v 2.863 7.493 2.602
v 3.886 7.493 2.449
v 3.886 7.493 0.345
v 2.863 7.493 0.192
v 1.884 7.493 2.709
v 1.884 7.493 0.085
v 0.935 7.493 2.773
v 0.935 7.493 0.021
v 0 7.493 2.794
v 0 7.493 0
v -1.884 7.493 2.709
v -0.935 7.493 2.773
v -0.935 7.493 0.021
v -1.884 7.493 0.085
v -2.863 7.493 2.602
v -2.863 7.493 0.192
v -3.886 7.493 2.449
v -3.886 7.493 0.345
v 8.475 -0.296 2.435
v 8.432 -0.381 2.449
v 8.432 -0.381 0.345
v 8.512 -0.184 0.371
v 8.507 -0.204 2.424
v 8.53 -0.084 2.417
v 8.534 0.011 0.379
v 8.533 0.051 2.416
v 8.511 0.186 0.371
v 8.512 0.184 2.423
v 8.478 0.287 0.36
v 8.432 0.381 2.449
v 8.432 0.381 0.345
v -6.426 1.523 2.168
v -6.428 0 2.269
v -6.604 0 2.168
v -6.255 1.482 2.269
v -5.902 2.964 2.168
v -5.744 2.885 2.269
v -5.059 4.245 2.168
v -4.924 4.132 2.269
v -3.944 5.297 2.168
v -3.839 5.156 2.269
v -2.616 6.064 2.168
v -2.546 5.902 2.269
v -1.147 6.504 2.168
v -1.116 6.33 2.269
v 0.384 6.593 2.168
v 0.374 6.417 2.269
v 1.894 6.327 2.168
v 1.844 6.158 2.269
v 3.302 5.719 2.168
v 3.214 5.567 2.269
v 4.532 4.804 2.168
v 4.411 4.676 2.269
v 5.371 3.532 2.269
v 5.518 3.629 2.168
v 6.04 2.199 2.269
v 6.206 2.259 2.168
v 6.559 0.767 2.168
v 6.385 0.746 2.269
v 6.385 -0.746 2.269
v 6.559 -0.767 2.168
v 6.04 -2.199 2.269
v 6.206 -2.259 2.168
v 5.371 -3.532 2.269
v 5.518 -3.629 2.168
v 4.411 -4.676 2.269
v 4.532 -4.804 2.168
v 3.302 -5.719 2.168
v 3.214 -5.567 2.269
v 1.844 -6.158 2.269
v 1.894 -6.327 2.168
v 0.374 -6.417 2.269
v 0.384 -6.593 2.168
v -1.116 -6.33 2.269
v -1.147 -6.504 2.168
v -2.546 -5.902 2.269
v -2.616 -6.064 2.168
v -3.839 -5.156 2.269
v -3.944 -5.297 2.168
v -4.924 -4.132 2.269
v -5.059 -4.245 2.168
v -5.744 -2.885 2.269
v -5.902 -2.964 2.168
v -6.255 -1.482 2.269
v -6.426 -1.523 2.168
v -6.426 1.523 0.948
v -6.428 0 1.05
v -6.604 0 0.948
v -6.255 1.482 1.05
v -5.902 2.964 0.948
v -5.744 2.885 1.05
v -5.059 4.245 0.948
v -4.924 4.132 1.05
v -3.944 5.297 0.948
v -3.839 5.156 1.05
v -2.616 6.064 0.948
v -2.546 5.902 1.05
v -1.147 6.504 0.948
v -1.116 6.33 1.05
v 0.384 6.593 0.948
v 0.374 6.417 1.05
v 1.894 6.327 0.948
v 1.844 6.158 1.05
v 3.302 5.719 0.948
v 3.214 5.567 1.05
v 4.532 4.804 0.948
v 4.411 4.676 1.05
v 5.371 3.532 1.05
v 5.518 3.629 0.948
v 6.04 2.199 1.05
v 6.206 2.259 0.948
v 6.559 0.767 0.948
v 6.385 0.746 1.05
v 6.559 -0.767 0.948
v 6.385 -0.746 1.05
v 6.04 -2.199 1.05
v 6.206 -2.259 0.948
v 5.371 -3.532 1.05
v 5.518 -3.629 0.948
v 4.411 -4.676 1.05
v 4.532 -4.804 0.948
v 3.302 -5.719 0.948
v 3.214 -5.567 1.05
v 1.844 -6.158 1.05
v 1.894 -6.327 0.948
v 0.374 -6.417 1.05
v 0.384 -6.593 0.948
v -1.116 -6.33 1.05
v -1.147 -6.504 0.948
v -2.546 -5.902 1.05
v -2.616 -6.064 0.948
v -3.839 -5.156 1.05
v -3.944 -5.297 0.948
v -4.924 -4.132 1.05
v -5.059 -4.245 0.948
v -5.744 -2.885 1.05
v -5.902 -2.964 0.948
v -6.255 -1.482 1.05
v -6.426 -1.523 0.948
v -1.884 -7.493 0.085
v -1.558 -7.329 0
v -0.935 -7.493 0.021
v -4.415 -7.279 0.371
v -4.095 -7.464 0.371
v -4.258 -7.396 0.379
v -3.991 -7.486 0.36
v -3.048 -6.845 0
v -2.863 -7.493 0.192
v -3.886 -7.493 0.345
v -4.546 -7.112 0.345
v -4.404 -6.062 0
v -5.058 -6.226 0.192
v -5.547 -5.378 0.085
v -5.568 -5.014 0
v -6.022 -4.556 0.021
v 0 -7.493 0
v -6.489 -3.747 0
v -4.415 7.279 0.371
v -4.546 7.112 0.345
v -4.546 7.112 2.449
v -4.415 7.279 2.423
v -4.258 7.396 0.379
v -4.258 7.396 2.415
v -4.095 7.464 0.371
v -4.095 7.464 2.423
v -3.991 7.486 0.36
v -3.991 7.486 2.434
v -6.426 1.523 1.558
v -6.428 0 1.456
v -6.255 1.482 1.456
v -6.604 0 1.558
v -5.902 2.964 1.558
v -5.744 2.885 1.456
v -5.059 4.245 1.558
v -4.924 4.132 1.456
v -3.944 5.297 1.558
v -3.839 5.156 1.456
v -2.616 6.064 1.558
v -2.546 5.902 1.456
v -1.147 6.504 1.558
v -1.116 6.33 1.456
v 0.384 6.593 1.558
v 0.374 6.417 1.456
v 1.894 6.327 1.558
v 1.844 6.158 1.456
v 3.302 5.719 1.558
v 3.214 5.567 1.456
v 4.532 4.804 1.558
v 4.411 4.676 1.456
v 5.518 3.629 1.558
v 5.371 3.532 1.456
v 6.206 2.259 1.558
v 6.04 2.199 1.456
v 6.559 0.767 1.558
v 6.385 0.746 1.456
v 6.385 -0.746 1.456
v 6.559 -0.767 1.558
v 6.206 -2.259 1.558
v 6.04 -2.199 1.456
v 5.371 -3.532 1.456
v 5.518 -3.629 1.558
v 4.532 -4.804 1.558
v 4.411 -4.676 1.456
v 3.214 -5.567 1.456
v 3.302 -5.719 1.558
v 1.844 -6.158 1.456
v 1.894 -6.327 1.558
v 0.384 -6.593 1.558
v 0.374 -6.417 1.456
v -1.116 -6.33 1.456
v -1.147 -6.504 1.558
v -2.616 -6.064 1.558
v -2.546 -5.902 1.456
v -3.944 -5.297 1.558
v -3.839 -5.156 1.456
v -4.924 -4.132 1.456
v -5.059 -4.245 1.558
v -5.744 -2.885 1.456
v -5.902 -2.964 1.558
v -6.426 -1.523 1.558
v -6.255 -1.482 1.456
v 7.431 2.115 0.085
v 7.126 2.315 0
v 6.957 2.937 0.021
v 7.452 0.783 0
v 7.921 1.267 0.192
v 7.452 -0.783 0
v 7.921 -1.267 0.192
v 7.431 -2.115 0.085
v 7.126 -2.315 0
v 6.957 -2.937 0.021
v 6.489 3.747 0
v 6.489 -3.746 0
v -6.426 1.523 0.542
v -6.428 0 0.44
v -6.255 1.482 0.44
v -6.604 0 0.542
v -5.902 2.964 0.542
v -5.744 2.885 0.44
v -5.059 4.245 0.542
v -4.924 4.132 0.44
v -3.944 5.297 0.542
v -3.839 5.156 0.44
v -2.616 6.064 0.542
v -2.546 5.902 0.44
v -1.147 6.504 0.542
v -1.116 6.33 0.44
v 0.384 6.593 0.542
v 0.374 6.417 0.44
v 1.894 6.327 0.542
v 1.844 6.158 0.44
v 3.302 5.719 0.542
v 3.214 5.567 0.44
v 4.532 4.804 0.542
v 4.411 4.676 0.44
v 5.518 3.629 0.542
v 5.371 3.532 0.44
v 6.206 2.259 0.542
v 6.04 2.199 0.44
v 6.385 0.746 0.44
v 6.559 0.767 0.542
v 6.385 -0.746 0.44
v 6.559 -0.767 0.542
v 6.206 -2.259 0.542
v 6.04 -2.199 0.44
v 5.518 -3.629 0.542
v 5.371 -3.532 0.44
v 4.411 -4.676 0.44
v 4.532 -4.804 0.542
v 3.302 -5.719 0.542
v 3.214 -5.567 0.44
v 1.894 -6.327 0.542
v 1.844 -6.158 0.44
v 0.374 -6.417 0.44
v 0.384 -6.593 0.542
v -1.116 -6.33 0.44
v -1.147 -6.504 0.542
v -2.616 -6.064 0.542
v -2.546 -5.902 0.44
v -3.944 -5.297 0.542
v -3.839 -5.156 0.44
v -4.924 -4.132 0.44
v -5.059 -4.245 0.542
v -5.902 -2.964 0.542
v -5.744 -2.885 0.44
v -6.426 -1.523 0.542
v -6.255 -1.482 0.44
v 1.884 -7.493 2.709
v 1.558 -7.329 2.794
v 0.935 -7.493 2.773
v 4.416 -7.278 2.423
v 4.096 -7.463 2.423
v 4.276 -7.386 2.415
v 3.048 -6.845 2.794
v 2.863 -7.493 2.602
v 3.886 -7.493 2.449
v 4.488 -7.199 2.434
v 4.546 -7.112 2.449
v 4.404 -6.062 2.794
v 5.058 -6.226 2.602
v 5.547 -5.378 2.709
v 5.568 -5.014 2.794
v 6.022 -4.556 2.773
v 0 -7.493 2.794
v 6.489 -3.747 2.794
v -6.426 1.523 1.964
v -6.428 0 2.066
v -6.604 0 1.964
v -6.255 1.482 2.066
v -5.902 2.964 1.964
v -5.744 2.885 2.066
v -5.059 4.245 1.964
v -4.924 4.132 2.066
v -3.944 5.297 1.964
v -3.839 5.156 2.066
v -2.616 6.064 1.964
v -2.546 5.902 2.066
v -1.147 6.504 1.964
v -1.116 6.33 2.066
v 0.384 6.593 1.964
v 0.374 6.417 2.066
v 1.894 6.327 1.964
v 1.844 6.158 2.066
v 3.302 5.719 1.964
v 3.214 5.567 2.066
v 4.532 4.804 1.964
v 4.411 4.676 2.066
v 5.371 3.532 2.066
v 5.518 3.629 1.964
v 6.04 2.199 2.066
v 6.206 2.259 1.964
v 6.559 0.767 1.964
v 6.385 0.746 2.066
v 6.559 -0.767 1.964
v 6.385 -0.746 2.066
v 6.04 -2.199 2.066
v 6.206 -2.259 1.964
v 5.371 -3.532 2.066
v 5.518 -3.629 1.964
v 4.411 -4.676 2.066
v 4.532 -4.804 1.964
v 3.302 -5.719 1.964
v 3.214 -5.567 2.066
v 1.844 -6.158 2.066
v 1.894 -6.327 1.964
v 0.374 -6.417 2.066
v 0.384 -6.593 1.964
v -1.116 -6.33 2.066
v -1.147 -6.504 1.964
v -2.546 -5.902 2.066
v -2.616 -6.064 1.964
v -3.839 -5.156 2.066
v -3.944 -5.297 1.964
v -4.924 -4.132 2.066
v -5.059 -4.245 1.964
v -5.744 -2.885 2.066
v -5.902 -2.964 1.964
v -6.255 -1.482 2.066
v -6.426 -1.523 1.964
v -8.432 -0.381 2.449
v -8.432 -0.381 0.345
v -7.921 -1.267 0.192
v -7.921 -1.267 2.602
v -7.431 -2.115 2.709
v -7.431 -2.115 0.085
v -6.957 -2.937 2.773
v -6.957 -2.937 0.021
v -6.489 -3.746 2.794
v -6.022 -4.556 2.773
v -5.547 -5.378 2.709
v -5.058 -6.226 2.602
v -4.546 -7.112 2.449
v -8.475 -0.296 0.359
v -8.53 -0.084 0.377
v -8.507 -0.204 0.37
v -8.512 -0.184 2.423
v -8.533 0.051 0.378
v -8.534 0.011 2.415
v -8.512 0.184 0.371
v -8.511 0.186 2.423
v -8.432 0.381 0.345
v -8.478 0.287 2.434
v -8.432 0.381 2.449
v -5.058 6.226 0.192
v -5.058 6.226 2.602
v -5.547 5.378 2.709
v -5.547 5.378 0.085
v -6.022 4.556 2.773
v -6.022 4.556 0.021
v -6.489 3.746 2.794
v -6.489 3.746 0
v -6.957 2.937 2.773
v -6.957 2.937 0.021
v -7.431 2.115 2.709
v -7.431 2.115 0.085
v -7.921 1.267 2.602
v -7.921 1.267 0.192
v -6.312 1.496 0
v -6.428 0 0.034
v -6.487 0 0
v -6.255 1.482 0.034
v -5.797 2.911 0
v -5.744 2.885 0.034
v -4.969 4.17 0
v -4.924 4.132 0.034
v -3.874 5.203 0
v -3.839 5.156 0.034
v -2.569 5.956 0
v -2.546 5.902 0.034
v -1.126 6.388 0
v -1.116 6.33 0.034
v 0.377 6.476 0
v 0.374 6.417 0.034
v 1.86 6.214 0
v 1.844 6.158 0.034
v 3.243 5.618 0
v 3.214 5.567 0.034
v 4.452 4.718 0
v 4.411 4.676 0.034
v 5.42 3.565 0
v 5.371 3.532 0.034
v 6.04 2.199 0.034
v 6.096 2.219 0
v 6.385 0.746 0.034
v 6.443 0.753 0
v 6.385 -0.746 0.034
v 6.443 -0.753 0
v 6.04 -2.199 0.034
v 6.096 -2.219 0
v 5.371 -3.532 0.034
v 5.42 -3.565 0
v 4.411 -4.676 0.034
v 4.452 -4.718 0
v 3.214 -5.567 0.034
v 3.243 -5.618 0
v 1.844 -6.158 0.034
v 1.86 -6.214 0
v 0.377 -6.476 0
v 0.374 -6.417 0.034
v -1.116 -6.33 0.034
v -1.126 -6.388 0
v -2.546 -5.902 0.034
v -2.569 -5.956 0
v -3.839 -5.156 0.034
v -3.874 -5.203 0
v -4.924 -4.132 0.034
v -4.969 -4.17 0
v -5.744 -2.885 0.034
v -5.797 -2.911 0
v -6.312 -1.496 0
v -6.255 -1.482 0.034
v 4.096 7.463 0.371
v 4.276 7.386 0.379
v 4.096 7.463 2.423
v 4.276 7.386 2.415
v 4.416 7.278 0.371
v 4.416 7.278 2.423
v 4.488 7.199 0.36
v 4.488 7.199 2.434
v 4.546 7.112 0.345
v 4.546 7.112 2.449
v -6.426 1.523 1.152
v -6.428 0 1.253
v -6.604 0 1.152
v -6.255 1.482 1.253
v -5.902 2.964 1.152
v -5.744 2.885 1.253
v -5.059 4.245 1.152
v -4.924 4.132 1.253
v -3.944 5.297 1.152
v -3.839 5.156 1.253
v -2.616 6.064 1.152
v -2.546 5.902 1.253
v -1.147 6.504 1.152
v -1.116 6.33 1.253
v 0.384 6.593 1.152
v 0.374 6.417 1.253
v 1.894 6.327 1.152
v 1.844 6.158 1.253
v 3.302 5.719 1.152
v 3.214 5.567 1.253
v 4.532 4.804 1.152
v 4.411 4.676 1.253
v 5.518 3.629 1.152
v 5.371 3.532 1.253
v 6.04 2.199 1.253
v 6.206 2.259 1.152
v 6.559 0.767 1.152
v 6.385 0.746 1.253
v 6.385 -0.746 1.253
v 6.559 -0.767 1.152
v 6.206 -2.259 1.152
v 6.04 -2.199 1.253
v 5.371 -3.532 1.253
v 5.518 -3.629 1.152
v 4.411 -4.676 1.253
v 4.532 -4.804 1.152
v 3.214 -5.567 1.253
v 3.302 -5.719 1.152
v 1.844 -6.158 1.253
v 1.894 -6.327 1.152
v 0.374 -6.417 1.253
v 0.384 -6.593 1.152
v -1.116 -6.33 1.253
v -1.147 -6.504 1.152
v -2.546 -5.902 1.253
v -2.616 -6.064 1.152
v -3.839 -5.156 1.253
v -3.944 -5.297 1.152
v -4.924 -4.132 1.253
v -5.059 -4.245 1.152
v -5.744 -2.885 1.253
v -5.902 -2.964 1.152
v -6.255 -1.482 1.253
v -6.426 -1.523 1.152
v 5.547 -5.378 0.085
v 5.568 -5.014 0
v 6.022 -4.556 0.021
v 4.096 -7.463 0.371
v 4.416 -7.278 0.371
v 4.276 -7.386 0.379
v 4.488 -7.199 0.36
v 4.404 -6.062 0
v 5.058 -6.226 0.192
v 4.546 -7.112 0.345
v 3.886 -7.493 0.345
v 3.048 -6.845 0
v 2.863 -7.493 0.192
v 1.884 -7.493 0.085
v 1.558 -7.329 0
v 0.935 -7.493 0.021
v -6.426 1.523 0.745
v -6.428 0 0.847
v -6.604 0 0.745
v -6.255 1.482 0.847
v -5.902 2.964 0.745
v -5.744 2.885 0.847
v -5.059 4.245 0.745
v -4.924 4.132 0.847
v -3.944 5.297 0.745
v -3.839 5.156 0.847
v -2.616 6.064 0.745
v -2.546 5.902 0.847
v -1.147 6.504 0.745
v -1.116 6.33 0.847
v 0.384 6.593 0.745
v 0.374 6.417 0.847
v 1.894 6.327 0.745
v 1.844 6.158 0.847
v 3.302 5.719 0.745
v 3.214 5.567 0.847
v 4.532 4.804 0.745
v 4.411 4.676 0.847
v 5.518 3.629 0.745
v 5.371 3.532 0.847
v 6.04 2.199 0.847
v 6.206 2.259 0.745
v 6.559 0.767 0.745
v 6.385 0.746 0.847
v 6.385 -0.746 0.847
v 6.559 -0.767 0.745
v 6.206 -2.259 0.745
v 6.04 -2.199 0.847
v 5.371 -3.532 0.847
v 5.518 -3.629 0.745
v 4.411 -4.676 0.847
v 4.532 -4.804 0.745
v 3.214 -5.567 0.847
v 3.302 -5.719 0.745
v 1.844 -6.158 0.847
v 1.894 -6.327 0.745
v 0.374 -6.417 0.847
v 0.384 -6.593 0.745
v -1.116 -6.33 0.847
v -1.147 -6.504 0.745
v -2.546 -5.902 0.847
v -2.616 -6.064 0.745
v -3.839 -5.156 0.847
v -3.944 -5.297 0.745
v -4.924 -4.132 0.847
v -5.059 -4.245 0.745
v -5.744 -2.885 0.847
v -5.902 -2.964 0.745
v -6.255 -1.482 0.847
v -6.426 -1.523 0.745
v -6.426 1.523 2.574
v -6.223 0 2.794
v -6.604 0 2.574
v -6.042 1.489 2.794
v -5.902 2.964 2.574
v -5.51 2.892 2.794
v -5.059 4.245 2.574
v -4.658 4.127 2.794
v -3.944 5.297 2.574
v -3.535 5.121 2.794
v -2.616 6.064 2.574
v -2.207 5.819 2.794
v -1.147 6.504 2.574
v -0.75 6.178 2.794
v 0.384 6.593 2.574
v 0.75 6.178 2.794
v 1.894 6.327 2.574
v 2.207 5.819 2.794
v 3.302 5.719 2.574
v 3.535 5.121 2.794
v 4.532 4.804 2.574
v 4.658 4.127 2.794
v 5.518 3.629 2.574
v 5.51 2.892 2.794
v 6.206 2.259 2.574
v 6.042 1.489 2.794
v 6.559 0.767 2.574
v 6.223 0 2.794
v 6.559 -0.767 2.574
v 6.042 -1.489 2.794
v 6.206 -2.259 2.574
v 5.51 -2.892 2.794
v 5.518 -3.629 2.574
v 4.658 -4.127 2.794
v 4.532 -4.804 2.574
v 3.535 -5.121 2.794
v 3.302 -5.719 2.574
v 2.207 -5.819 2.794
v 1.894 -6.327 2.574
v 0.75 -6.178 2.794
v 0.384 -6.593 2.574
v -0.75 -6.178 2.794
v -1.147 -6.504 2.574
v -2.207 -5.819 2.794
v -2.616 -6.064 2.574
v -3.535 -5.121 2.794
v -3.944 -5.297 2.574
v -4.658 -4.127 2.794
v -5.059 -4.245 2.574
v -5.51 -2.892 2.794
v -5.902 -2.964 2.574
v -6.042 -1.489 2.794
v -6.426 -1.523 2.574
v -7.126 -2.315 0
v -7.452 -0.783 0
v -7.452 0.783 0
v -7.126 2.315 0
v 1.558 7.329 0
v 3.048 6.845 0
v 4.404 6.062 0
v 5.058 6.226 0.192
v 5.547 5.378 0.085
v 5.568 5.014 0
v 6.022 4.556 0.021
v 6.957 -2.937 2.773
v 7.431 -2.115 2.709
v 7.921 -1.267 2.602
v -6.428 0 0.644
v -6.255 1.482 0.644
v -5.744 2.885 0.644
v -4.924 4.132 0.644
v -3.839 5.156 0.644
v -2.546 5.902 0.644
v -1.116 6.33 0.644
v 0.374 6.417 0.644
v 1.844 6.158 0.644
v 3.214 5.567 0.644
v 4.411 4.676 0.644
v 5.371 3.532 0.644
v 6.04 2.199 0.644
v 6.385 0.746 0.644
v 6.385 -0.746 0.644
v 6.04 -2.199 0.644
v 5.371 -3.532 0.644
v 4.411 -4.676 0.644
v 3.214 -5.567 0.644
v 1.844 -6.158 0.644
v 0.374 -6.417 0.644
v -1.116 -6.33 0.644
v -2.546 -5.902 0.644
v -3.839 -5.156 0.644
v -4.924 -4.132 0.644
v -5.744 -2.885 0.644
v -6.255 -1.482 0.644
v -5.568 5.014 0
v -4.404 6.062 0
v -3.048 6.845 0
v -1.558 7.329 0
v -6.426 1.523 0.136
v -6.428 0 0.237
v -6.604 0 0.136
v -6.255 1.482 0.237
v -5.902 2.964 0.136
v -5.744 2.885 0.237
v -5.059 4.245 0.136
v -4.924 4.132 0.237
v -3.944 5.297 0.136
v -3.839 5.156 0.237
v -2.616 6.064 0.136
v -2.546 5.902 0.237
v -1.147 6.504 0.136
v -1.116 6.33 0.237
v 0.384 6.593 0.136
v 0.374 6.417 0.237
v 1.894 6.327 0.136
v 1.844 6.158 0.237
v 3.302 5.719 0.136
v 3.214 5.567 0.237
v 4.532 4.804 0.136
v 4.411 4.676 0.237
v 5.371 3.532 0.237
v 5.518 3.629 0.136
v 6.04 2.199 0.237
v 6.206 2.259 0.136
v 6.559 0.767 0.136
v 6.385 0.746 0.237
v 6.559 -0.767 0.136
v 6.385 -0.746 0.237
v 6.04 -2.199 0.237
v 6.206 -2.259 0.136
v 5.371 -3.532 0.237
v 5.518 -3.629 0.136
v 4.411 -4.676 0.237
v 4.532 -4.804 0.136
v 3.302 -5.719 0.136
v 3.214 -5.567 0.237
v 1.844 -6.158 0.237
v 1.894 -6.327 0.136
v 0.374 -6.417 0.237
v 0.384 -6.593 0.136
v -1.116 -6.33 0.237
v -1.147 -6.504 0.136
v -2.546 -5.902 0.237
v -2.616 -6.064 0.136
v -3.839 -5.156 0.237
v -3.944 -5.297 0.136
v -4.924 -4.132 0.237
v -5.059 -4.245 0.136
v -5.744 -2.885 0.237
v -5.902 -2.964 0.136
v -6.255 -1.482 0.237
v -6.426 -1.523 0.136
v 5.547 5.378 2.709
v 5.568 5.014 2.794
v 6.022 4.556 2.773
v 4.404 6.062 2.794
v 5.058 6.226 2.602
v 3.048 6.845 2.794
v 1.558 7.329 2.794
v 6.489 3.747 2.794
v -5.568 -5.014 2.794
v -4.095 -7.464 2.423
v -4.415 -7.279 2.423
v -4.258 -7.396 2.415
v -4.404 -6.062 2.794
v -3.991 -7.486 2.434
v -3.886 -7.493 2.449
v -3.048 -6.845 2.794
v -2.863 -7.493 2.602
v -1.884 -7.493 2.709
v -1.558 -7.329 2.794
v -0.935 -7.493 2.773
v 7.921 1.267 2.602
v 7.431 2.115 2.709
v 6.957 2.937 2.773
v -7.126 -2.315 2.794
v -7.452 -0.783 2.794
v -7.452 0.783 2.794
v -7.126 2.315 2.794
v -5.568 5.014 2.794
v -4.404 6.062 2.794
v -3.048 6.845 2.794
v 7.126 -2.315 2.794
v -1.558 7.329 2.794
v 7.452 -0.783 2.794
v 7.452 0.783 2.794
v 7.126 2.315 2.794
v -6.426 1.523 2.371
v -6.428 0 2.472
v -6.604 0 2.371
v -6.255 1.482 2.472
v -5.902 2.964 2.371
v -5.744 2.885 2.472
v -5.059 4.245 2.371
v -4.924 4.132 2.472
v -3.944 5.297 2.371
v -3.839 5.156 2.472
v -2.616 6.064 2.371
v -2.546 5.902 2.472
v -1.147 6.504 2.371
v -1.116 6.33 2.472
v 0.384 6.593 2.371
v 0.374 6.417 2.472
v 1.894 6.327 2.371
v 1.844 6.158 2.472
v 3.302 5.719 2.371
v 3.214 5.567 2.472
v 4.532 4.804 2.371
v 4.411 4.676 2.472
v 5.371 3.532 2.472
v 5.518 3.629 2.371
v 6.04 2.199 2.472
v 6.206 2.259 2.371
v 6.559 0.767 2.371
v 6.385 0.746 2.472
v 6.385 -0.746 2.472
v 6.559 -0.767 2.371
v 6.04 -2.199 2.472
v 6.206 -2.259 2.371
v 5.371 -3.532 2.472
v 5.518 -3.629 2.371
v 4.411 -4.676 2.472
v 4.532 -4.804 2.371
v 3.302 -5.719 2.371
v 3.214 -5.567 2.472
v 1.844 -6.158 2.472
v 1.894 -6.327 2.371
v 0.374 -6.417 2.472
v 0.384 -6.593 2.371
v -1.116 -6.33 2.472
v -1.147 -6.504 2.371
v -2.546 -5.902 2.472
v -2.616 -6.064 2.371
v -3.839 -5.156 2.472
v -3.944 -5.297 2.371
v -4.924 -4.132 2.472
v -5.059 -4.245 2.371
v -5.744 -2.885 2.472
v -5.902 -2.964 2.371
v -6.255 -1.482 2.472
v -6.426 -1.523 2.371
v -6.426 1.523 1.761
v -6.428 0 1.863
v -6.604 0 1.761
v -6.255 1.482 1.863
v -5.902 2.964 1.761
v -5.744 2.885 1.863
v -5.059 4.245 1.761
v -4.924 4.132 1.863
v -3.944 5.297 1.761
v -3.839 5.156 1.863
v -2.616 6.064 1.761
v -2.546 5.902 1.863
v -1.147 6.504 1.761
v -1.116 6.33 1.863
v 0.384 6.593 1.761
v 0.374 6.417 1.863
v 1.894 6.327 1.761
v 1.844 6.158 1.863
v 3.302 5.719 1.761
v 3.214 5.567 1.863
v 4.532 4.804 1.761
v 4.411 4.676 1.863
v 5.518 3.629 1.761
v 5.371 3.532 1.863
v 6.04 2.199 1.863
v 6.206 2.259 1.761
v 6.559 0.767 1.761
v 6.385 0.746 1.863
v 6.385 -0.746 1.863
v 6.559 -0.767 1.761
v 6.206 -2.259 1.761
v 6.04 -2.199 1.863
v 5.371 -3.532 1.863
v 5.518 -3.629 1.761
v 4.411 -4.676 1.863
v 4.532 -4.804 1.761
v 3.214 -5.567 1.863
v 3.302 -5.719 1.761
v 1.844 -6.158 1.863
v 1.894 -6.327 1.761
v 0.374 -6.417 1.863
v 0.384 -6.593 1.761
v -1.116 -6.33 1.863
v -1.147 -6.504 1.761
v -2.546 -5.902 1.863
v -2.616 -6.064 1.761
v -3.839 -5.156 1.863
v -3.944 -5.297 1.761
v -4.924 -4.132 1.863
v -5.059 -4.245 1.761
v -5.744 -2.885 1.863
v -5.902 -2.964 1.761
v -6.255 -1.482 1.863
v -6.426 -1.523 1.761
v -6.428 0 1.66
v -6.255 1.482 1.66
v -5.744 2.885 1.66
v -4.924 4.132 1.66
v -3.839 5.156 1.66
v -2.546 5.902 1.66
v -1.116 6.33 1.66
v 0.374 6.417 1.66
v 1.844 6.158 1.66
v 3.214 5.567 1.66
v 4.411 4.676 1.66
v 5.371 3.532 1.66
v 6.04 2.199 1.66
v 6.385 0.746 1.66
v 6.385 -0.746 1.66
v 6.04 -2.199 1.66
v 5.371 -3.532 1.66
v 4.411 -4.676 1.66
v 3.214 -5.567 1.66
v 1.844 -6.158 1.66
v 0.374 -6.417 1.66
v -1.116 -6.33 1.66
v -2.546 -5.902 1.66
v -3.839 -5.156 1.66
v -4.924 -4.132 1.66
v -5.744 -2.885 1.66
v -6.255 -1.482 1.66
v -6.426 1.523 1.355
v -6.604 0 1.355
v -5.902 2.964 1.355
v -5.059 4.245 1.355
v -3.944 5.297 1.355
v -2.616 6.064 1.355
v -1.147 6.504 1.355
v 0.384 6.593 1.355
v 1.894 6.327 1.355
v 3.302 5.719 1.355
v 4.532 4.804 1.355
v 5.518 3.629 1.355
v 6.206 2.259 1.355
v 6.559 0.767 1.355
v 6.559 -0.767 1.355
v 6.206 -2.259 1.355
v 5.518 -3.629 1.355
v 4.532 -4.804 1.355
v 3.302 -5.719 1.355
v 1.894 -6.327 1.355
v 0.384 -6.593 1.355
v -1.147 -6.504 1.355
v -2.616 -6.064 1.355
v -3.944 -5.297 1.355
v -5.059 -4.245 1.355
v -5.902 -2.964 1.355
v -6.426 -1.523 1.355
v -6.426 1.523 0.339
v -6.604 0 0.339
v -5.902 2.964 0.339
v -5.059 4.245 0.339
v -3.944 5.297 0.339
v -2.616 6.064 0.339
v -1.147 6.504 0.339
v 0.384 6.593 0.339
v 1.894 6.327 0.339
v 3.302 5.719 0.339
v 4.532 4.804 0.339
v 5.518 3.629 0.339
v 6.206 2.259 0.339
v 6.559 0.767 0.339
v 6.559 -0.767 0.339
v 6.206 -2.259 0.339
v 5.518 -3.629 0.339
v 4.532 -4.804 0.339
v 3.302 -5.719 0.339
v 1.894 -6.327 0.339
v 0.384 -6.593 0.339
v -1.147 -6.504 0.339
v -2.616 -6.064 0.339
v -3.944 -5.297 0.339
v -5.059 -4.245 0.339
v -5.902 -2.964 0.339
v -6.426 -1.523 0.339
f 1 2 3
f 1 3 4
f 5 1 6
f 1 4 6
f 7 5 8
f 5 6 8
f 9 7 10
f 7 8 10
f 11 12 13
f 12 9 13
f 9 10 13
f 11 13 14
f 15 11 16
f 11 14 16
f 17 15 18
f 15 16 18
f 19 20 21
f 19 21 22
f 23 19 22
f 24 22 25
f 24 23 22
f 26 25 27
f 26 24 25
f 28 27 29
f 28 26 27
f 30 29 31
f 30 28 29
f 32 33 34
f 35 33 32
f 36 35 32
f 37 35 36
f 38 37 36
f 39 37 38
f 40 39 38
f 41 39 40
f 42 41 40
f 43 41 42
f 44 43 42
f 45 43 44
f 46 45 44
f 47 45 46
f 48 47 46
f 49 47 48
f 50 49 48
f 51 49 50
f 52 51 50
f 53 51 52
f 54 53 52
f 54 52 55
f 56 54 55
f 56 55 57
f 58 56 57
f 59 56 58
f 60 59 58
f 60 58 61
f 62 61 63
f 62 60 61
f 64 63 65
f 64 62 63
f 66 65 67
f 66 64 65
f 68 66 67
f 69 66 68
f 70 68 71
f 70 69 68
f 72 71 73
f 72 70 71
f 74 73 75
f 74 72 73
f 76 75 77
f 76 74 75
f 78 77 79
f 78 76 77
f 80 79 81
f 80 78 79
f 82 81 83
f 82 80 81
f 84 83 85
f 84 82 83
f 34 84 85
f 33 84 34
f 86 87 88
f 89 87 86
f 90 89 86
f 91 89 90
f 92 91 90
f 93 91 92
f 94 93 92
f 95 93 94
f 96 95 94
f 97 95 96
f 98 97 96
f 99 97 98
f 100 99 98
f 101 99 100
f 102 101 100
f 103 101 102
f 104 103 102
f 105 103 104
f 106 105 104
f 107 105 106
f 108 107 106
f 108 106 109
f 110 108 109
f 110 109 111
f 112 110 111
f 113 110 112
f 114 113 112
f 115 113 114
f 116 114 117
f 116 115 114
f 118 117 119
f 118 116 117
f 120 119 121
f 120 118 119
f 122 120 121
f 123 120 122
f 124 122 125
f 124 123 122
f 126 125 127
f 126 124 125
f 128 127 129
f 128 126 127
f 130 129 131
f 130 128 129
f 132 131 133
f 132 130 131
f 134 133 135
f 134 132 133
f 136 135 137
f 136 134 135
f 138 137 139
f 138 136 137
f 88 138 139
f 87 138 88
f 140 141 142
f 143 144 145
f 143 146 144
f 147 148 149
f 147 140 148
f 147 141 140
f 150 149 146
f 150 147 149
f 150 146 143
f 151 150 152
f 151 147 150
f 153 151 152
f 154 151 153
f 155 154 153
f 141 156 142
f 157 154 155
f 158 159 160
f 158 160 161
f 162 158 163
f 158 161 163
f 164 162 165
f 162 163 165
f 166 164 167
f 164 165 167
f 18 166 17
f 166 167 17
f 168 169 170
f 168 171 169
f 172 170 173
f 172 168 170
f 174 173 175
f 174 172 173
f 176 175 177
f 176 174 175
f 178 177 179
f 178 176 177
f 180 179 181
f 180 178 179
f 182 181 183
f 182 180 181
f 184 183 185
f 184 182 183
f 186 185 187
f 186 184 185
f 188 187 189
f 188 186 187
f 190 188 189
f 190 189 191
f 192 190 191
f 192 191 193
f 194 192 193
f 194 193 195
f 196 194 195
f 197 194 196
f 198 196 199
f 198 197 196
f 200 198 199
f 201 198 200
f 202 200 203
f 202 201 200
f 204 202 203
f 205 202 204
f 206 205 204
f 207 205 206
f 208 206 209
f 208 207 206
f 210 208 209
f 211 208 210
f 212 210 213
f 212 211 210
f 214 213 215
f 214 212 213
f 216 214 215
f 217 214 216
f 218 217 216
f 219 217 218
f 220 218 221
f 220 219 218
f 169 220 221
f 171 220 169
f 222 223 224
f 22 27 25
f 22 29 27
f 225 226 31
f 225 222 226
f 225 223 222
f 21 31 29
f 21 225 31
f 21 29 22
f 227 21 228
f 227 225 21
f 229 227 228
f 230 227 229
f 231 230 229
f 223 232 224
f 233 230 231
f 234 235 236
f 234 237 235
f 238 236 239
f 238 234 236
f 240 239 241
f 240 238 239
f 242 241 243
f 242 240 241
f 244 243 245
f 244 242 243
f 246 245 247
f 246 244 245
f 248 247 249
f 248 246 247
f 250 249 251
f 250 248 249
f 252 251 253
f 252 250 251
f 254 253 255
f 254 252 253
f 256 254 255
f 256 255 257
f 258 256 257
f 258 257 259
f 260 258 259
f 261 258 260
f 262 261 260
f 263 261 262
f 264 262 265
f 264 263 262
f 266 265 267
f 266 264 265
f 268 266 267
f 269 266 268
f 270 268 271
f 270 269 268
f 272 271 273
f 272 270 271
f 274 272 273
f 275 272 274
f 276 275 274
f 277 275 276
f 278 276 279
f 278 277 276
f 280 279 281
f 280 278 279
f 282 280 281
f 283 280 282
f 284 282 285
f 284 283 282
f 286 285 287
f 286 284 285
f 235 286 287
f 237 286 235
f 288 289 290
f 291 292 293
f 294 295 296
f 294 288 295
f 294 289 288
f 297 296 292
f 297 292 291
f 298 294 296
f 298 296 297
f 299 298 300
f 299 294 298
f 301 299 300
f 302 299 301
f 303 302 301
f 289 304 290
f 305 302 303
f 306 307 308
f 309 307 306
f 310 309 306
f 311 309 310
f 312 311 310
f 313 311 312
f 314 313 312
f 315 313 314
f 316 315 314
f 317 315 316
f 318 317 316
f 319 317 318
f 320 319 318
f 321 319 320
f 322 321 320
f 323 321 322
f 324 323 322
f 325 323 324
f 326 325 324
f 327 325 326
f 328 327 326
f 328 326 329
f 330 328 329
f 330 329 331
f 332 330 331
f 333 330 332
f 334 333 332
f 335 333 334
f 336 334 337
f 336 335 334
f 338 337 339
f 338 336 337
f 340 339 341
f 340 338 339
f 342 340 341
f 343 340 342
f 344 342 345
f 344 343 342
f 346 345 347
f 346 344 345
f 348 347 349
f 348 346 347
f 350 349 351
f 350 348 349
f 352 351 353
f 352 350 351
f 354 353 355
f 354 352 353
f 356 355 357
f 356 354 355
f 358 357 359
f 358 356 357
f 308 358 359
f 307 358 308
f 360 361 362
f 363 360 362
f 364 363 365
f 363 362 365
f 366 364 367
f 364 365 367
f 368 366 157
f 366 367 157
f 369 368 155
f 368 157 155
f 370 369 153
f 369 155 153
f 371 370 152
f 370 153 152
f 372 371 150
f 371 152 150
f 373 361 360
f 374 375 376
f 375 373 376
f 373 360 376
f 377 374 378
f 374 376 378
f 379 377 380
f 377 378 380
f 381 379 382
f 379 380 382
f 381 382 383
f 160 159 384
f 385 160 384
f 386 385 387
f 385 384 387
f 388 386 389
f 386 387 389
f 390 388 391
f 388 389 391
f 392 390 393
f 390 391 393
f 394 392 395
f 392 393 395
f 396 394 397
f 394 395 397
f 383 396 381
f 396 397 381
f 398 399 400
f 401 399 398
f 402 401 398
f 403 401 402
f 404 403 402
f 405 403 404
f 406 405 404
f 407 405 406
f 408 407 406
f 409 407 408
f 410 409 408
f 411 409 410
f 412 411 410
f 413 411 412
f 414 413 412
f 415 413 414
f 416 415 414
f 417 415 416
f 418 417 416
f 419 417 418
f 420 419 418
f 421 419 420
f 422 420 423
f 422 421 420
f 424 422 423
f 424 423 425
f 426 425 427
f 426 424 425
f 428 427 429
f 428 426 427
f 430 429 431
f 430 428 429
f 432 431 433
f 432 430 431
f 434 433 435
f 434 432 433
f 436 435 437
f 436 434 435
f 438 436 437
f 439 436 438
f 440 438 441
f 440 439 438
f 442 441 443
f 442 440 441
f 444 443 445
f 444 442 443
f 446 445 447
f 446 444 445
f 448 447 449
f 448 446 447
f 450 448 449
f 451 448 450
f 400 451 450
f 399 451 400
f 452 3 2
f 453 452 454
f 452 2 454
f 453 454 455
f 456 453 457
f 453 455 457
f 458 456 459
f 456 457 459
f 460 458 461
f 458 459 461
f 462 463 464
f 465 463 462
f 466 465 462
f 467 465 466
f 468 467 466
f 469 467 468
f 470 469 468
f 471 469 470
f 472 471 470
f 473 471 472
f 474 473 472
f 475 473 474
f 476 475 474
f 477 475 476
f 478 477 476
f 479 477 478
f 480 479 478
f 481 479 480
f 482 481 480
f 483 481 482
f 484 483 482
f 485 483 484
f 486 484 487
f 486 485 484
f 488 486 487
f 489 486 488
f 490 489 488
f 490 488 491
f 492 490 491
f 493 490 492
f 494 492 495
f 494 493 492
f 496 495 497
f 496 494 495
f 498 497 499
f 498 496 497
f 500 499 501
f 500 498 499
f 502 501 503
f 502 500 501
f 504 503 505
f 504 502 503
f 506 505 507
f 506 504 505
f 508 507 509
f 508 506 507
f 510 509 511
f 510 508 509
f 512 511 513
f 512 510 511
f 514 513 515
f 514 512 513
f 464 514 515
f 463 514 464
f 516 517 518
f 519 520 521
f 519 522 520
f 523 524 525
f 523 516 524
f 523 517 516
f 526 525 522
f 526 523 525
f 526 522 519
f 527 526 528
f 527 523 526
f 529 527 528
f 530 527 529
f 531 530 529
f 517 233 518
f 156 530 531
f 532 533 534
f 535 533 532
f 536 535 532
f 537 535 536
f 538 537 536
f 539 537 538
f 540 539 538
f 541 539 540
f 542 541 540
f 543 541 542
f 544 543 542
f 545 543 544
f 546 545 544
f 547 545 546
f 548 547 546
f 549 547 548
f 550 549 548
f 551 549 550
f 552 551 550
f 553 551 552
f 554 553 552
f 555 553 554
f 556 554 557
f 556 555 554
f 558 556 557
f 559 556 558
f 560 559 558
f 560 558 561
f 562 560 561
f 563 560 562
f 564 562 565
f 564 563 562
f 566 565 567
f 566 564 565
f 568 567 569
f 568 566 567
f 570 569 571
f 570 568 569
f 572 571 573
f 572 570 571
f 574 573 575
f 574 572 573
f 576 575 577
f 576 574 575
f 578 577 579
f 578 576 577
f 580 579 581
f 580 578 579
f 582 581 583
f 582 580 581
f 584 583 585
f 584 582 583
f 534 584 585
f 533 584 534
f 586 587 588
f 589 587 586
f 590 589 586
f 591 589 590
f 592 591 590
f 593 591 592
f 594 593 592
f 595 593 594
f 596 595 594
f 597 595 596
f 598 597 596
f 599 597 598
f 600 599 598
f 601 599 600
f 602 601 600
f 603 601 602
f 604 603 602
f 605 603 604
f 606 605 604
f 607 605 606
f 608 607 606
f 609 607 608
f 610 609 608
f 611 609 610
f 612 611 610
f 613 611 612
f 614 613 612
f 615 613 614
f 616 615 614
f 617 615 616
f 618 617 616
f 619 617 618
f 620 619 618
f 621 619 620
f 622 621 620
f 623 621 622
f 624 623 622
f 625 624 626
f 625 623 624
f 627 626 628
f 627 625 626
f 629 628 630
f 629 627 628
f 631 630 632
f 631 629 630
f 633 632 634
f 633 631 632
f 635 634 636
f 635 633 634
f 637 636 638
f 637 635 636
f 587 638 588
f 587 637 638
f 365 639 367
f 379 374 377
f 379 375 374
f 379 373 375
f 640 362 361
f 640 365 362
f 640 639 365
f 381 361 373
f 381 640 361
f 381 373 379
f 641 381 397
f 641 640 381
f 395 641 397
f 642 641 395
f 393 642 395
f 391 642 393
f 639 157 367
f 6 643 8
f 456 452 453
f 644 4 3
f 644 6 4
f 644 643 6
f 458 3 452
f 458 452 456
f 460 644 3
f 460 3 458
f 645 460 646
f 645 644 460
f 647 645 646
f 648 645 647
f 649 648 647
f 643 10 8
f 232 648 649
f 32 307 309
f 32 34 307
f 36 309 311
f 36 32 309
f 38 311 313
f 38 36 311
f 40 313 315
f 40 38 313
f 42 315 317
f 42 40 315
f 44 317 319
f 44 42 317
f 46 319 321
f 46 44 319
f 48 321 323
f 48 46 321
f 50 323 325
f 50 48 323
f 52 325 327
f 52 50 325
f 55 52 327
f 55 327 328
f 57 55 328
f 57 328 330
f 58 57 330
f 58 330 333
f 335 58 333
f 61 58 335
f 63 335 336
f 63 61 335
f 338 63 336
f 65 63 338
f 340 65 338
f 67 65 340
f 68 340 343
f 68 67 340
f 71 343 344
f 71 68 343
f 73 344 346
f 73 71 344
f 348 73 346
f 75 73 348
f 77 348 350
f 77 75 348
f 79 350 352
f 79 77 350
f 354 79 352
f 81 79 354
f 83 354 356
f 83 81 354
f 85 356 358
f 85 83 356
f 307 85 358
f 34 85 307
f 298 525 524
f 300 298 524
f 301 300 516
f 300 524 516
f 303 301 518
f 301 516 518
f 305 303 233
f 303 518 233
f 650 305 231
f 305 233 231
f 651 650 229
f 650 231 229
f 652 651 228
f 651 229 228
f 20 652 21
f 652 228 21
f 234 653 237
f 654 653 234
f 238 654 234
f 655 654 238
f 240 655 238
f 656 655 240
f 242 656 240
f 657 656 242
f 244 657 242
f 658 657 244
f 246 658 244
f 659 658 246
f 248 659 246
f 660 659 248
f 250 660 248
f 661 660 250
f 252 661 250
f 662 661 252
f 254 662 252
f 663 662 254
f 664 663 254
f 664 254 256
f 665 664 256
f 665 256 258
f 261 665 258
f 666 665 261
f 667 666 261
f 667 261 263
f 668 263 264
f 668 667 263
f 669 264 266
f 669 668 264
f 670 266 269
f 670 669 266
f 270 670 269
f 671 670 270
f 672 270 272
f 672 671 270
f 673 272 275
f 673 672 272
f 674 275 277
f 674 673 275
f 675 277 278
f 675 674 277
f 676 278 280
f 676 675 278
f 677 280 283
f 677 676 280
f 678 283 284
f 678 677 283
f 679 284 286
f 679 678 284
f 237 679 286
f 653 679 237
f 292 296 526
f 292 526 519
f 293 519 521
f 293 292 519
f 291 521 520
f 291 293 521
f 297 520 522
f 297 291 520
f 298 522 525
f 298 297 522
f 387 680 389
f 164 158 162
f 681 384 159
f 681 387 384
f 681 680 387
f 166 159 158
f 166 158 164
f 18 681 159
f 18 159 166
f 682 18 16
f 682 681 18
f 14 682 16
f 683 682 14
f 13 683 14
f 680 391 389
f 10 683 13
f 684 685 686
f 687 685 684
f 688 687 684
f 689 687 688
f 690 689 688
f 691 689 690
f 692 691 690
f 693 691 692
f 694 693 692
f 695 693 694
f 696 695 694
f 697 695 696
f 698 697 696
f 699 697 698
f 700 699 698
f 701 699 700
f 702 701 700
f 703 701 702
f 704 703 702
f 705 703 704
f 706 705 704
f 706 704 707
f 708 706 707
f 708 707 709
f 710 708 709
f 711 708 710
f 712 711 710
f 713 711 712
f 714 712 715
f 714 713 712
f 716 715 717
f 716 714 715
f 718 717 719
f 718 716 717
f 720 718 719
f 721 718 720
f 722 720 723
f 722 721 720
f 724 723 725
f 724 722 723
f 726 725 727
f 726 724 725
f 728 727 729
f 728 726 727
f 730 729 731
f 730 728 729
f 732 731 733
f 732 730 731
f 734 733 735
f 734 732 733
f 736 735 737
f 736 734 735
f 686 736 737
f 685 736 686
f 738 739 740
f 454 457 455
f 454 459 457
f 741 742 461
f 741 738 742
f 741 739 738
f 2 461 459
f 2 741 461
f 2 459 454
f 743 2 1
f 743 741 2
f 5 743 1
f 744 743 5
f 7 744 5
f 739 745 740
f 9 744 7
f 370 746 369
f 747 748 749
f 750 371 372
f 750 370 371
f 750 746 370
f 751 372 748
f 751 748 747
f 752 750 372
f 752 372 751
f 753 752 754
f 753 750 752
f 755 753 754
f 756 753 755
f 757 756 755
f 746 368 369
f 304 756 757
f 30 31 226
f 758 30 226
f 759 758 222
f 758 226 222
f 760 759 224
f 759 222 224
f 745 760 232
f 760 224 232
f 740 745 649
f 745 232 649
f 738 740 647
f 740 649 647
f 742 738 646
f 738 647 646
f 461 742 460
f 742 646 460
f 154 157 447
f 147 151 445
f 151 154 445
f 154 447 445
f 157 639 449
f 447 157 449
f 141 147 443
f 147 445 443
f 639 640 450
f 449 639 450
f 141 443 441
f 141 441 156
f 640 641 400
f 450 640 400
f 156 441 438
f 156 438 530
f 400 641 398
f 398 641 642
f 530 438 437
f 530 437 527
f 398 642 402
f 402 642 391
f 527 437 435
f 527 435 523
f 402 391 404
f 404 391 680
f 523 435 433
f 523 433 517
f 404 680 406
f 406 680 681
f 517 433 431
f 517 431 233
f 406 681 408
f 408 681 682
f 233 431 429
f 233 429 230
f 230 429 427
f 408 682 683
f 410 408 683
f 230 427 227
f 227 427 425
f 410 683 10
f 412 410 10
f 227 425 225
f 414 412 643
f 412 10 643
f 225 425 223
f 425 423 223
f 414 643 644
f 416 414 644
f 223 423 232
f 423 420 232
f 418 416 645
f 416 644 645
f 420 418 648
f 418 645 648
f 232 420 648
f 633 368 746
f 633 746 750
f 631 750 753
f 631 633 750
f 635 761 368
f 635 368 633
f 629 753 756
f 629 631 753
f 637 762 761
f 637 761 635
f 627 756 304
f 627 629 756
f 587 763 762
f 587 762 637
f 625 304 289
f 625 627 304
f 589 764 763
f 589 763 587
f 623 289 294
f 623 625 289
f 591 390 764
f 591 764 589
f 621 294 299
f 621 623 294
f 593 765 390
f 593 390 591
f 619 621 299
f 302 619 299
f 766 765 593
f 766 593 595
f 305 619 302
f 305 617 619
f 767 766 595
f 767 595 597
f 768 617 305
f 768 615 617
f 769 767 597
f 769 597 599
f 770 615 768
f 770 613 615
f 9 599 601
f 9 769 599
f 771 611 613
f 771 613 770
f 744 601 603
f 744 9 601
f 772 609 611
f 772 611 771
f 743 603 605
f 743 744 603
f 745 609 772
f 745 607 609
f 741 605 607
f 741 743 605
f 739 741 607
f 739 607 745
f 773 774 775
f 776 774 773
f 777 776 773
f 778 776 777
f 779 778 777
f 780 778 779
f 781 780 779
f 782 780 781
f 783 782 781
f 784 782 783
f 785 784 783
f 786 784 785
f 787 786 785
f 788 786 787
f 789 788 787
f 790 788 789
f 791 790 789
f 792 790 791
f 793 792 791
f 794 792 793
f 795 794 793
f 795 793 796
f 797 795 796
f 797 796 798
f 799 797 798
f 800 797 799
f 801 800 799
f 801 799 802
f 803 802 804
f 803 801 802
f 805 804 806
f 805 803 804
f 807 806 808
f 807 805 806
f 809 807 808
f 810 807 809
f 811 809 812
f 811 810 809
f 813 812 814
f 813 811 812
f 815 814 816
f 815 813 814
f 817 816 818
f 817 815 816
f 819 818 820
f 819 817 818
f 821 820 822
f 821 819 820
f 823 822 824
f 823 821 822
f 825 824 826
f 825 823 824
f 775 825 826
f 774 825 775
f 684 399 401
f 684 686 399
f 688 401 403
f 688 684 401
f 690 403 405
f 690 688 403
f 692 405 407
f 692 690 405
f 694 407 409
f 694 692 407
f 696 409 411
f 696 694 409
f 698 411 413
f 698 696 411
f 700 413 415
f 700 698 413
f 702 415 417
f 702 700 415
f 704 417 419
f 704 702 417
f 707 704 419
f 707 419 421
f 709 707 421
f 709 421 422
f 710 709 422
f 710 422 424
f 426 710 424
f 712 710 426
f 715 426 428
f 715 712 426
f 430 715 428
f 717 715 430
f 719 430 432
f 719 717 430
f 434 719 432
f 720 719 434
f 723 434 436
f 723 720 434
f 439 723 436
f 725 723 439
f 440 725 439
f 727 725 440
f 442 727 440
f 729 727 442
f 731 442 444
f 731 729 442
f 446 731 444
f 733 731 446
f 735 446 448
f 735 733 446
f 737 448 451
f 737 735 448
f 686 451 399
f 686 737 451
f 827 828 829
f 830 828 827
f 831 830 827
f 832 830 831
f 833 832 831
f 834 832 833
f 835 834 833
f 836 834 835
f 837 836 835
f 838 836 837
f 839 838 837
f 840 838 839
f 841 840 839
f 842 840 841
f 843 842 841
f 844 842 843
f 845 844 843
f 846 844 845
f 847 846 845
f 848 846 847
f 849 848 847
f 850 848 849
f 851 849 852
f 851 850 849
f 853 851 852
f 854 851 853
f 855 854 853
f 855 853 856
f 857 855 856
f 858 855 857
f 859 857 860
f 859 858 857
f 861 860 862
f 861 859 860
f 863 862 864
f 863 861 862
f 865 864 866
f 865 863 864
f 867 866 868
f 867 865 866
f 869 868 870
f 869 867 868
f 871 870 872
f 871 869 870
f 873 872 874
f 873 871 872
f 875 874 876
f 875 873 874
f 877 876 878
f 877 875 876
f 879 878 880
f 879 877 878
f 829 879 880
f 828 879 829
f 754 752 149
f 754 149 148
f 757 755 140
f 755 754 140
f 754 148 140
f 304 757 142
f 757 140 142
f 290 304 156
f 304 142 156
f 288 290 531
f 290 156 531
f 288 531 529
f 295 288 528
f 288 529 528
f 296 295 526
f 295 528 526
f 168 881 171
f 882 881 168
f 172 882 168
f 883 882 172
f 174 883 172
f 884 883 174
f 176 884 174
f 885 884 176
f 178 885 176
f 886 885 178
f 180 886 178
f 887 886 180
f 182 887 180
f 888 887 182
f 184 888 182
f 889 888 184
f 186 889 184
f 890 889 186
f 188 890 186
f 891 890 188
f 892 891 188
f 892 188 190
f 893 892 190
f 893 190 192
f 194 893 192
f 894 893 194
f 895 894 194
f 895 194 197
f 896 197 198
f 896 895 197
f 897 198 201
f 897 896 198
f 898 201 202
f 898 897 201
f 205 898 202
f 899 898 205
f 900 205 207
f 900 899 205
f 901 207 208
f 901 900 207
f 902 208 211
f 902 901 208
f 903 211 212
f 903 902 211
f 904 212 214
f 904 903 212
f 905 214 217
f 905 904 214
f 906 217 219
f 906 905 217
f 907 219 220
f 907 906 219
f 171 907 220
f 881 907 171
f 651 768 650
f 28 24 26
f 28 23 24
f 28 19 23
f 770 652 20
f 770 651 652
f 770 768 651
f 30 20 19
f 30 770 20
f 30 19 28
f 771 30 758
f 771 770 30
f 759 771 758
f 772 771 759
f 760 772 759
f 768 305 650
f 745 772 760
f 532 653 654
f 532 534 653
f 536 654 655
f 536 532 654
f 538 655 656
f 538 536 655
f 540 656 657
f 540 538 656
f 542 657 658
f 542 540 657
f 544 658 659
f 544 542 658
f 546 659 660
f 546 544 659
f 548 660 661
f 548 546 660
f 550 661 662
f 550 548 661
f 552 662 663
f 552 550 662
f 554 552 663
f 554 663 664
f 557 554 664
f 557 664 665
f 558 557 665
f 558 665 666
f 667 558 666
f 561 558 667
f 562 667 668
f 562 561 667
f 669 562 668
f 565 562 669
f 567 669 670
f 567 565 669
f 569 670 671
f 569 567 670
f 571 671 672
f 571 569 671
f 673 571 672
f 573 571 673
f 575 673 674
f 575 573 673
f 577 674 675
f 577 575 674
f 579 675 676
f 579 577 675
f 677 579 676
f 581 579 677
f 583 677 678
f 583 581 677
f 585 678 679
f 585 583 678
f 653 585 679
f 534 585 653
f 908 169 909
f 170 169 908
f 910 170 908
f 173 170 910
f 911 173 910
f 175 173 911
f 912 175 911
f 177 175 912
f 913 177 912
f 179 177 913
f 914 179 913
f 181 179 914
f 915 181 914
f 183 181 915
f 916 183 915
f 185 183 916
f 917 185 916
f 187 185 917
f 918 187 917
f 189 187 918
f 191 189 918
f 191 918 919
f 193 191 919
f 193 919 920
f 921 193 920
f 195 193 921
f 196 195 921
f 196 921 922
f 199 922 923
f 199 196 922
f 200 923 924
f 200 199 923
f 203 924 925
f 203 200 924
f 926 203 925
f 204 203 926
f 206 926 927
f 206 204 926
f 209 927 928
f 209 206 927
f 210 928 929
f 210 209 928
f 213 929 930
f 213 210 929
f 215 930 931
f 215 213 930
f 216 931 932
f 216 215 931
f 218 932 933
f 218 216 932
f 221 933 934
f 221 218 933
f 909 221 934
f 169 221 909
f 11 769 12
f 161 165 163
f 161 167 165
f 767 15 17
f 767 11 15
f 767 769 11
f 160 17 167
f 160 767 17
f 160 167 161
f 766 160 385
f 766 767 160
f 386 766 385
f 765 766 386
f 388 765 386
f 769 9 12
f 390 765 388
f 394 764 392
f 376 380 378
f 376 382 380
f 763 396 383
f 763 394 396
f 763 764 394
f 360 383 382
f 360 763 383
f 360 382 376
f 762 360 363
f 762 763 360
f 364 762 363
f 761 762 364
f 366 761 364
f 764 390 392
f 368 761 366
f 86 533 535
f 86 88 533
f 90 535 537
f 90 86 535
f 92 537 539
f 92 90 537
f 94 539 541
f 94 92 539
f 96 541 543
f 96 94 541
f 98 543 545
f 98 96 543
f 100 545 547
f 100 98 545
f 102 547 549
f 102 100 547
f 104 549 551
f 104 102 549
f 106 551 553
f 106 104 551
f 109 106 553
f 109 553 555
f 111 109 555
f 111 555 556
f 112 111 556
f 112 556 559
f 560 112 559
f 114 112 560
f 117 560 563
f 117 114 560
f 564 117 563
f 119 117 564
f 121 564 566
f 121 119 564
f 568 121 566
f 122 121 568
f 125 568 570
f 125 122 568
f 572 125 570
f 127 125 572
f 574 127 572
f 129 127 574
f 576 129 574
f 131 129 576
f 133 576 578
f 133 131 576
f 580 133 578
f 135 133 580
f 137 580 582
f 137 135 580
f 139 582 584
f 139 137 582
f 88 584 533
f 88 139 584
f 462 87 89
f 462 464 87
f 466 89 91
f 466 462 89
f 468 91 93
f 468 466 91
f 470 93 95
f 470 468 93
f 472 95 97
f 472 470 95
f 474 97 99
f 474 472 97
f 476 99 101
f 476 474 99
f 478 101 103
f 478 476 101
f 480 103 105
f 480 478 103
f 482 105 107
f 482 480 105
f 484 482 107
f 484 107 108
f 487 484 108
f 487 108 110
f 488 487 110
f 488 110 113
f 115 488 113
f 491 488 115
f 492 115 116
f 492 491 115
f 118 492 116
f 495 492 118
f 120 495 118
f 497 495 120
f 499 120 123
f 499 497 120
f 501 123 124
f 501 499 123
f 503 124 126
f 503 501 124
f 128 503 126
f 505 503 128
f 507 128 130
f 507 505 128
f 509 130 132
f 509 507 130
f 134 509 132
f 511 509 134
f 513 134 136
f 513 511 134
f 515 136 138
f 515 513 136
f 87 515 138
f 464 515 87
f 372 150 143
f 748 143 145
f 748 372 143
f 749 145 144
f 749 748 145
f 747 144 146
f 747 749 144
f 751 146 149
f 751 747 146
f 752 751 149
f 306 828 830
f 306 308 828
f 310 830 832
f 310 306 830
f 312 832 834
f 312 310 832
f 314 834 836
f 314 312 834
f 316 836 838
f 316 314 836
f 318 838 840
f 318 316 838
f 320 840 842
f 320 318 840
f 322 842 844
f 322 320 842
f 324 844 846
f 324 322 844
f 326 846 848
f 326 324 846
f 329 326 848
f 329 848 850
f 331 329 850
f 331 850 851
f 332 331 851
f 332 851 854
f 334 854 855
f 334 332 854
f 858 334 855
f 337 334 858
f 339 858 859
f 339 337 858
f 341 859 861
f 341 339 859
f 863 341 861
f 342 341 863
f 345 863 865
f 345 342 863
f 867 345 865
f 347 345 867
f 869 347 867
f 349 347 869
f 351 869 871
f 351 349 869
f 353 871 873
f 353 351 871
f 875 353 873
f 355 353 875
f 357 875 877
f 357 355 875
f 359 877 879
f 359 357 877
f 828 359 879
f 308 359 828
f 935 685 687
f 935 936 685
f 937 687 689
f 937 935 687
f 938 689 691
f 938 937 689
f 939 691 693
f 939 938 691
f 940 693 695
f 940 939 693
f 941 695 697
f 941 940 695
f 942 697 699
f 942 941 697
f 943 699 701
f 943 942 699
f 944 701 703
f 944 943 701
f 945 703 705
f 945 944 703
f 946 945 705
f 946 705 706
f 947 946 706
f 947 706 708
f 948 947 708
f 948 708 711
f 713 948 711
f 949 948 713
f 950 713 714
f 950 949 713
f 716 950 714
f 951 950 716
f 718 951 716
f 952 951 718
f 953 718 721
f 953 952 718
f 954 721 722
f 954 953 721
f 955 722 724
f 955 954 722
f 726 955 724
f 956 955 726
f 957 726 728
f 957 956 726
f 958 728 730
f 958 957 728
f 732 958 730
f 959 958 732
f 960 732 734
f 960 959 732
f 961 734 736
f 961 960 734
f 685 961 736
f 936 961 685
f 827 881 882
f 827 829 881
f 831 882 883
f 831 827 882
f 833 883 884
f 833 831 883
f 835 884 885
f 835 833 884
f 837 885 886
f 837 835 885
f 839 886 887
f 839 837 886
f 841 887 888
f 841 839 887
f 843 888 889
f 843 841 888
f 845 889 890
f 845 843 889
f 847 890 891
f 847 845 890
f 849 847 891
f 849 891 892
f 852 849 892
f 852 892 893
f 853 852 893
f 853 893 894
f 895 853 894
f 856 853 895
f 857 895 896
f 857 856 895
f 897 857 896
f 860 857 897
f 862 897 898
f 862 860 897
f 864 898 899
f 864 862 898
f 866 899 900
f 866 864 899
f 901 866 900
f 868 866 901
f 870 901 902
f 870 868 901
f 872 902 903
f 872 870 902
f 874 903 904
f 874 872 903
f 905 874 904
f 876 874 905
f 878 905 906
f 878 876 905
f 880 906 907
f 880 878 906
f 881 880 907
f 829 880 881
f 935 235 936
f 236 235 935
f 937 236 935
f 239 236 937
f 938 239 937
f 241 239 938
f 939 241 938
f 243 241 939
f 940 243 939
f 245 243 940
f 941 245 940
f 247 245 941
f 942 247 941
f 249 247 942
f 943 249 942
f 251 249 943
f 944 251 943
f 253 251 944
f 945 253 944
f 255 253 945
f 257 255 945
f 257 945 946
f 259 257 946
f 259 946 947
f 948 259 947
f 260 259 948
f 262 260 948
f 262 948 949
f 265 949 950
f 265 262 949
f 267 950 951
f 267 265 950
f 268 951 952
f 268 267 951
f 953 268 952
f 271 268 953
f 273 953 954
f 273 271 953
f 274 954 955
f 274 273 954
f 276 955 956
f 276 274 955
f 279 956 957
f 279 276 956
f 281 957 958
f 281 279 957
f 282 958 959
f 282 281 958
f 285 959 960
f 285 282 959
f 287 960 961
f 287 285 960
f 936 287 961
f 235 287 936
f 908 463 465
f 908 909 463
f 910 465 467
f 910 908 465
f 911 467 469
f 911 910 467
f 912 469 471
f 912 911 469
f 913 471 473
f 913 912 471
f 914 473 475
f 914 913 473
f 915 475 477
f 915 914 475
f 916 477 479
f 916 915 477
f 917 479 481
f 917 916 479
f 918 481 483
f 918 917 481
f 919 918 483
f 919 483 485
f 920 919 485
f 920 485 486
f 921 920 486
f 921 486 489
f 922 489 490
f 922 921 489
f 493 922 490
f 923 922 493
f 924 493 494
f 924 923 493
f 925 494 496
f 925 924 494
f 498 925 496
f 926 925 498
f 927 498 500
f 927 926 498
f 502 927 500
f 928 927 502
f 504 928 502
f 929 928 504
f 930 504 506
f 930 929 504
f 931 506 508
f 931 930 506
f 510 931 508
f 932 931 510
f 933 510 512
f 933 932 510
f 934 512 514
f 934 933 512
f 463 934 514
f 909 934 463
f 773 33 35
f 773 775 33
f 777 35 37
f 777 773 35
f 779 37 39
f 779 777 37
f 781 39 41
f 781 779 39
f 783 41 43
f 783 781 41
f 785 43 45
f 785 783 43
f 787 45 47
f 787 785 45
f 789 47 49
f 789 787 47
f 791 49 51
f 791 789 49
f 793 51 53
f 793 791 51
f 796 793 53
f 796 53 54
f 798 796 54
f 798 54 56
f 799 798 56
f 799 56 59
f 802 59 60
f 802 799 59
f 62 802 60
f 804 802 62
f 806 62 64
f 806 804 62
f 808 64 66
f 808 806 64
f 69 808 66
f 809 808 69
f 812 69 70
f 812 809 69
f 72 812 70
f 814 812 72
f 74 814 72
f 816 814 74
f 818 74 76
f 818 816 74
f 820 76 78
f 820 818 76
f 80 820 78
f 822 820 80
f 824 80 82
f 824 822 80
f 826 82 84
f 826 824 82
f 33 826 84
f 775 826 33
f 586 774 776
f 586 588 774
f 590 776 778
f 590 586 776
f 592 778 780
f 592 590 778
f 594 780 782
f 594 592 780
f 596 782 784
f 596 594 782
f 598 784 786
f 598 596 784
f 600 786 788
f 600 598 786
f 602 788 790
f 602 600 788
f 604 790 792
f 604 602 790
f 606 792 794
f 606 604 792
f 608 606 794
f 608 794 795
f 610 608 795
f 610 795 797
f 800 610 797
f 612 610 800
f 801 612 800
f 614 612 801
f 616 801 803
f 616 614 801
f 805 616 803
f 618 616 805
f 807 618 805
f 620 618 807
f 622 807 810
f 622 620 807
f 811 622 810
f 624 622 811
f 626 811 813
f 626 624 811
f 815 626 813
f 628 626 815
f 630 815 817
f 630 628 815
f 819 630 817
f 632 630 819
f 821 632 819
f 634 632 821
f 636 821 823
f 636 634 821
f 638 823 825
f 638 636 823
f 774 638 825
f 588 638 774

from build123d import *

# Parameters (mm, degrees)
SKETCH1_R          = 6.223
EXTRUDE1_DEPTH     = 2.794
FILLET1_R          = 0.762
SKETCH2_OUTSIDE_W  = 44.492
SKETCH2_OUTSIDE_H  = 42.41
SKETCH2_OUTSIDE_R  = 7.493
CUT_EXTRUDE1_DEPTH = 3.794
CUT_EXTRUDE1_DRAFT = -70
SKETCH3_OUTSIDE_W  = 44.492
SKETCH3_OUTSIDE_H  = 42.41
SKETCH3_OUTSIDE_R  = 7.493
CUT_EXTRUDE2_DEPTH = 3.7940001
CUT_EXTRUDE2_DRAFT = -70
LPATTERN1_COUNT    = 14
LPATTERN1_PITCH    = 0.2032


with BuildPart() as part:
    # Sketch1 → Extrude1 (new body)
    with BuildSketch(Plane.XY):
        Polygon((-8.652171134, 0), (-4.326085567, -7.493), (4.326085567, -7.493), (8.652171134, 0), (4.326085567, 7.493), (-4.326085567, 7.493), align=None)
        Circle(SKETCH1_R, mode=Mode.SUBTRACT)
    extrude(amount=EXTRUDE1_DEPTH)

    # Fillet1
    fillet1_edges = [part.edges().sort_by_distance(p)[0] for p in [
        (8.652171134, 0, 1.397),
        (4.326085567, -7.493, 1.397),
        (-4.326085567, -7.493, 1.397),
        (-8.652171134, 0, 1.397),
        (-4.326085567, 7.493, 1.397),
        (4.326085567, 7.493, 1.397),
    ]]
    fillet(fillet1_edges, radius=FILLET1_R)


with BuildPart() as cut_extrude1_tool:
    # Sketch2 outside → Cut-Extrude1 (with draft: the straight prism first)
    with BuildSketch(Plane.XY.offset(2.794)):
        Rectangle(SKETCH2_OUTSIDE_W, SKETCH2_OUTSIDE_H)
        Circle(SKETCH2_OUTSIDE_R, mode=Mode.SUBTRACT)
    extrude(amount=-CUT_EXTRUDE1_DEPTH)
    # Cut-Extrude1: the draft: its side faces are tilted about the plane it starts from
    cut_extrude1_sides = [cut_extrude1_tool.faces().sort_by_distance(p)[0] for p in [
        (0, -21.205, 0.897),
        (22.246, 0, 0.897),
        (0, 21.205, 0.897),
        (-22.246, 0, 0.897),
        (-7.493, 0, 0.897),
    ]]
    draft(cut_extrude1_sides, Plane.XY.offset(2.794), CUT_EXTRUDE1_DRAFT)


with BuildPart() as part_1:
    add(part.part)

    # Cut-Extrude1: cut by cut_extrude1_tool
    add(cut_extrude1_tool.part, mode=Mode.SUBTRACT)


with BuildPart() as cut_extrude2_tool:
    # Sketch3 outside → Cut-Extrude2 (with draft: the straight prism first)
    with BuildSketch(Plane(origin=(0, 0, 0), x_dir=(-1, 0, 0), z_dir=(0, 0, -1))):
        Rectangle(SKETCH3_OUTSIDE_W, SKETCH3_OUTSIDE_H)
        Circle(SKETCH3_OUTSIDE_R, mode=Mode.SUBTRACT)
    extrude(amount=-CUT_EXTRUDE2_DEPTH)
    # Cut-Extrude2: the draft: its side faces are tilted about the plane it starts from
    cut_extrude2_sides = [cut_extrude2_tool.faces().sort_by_distance(p)[0] for p in [
        (0, -21.205, 1.89700005),
        (-22.246, 0, 1.89700005),
        (0, 21.205, 1.89700005),
        (22.246, 0, 1.89700005),
        (7.493, 0, 1.89700005),
    ]]
    draft(cut_extrude2_sides, Plane(origin=(0, 0, 0), x_dir=(-1, 0, 0), z_dir=(0, 0, -1)), CUT_EXTRUDE2_DRAFT)


with BuildPart() as part_2:
    add(part_1.part)

    # Cut-Extrude2: cut by cut_extrude2_tool
    add(cut_extrude2_tool.part, mode=Mode.SUBTRACT)

    # Sketch4 → Cut-Revolve1 (revolve, cut)
    with BuildSketch(Plane(origin=(0, 0, 0), x_dir=(1, 0, 0), z_dir=(0, 1, 0))):
        Polygon((-6.223, -2.794), (-6.223, -2.354059095), (-6.604, -2.574029547), align=None)
    cut_revolve1 = revolve(axis=Axis((0, 0, 2.794), (0, 0, -1)), mode=Mode.SUBTRACT)

    # LPattern1: Cut-Revolve1 ×14
    with Locations(*[(0, 0, -i * LPATTERN1_PITCH) for i in range(1, LPATTERN1_COUNT)]):
        add(cut_revolve1, mode=Mode.SUBTRACT)


solid = part_2.part
